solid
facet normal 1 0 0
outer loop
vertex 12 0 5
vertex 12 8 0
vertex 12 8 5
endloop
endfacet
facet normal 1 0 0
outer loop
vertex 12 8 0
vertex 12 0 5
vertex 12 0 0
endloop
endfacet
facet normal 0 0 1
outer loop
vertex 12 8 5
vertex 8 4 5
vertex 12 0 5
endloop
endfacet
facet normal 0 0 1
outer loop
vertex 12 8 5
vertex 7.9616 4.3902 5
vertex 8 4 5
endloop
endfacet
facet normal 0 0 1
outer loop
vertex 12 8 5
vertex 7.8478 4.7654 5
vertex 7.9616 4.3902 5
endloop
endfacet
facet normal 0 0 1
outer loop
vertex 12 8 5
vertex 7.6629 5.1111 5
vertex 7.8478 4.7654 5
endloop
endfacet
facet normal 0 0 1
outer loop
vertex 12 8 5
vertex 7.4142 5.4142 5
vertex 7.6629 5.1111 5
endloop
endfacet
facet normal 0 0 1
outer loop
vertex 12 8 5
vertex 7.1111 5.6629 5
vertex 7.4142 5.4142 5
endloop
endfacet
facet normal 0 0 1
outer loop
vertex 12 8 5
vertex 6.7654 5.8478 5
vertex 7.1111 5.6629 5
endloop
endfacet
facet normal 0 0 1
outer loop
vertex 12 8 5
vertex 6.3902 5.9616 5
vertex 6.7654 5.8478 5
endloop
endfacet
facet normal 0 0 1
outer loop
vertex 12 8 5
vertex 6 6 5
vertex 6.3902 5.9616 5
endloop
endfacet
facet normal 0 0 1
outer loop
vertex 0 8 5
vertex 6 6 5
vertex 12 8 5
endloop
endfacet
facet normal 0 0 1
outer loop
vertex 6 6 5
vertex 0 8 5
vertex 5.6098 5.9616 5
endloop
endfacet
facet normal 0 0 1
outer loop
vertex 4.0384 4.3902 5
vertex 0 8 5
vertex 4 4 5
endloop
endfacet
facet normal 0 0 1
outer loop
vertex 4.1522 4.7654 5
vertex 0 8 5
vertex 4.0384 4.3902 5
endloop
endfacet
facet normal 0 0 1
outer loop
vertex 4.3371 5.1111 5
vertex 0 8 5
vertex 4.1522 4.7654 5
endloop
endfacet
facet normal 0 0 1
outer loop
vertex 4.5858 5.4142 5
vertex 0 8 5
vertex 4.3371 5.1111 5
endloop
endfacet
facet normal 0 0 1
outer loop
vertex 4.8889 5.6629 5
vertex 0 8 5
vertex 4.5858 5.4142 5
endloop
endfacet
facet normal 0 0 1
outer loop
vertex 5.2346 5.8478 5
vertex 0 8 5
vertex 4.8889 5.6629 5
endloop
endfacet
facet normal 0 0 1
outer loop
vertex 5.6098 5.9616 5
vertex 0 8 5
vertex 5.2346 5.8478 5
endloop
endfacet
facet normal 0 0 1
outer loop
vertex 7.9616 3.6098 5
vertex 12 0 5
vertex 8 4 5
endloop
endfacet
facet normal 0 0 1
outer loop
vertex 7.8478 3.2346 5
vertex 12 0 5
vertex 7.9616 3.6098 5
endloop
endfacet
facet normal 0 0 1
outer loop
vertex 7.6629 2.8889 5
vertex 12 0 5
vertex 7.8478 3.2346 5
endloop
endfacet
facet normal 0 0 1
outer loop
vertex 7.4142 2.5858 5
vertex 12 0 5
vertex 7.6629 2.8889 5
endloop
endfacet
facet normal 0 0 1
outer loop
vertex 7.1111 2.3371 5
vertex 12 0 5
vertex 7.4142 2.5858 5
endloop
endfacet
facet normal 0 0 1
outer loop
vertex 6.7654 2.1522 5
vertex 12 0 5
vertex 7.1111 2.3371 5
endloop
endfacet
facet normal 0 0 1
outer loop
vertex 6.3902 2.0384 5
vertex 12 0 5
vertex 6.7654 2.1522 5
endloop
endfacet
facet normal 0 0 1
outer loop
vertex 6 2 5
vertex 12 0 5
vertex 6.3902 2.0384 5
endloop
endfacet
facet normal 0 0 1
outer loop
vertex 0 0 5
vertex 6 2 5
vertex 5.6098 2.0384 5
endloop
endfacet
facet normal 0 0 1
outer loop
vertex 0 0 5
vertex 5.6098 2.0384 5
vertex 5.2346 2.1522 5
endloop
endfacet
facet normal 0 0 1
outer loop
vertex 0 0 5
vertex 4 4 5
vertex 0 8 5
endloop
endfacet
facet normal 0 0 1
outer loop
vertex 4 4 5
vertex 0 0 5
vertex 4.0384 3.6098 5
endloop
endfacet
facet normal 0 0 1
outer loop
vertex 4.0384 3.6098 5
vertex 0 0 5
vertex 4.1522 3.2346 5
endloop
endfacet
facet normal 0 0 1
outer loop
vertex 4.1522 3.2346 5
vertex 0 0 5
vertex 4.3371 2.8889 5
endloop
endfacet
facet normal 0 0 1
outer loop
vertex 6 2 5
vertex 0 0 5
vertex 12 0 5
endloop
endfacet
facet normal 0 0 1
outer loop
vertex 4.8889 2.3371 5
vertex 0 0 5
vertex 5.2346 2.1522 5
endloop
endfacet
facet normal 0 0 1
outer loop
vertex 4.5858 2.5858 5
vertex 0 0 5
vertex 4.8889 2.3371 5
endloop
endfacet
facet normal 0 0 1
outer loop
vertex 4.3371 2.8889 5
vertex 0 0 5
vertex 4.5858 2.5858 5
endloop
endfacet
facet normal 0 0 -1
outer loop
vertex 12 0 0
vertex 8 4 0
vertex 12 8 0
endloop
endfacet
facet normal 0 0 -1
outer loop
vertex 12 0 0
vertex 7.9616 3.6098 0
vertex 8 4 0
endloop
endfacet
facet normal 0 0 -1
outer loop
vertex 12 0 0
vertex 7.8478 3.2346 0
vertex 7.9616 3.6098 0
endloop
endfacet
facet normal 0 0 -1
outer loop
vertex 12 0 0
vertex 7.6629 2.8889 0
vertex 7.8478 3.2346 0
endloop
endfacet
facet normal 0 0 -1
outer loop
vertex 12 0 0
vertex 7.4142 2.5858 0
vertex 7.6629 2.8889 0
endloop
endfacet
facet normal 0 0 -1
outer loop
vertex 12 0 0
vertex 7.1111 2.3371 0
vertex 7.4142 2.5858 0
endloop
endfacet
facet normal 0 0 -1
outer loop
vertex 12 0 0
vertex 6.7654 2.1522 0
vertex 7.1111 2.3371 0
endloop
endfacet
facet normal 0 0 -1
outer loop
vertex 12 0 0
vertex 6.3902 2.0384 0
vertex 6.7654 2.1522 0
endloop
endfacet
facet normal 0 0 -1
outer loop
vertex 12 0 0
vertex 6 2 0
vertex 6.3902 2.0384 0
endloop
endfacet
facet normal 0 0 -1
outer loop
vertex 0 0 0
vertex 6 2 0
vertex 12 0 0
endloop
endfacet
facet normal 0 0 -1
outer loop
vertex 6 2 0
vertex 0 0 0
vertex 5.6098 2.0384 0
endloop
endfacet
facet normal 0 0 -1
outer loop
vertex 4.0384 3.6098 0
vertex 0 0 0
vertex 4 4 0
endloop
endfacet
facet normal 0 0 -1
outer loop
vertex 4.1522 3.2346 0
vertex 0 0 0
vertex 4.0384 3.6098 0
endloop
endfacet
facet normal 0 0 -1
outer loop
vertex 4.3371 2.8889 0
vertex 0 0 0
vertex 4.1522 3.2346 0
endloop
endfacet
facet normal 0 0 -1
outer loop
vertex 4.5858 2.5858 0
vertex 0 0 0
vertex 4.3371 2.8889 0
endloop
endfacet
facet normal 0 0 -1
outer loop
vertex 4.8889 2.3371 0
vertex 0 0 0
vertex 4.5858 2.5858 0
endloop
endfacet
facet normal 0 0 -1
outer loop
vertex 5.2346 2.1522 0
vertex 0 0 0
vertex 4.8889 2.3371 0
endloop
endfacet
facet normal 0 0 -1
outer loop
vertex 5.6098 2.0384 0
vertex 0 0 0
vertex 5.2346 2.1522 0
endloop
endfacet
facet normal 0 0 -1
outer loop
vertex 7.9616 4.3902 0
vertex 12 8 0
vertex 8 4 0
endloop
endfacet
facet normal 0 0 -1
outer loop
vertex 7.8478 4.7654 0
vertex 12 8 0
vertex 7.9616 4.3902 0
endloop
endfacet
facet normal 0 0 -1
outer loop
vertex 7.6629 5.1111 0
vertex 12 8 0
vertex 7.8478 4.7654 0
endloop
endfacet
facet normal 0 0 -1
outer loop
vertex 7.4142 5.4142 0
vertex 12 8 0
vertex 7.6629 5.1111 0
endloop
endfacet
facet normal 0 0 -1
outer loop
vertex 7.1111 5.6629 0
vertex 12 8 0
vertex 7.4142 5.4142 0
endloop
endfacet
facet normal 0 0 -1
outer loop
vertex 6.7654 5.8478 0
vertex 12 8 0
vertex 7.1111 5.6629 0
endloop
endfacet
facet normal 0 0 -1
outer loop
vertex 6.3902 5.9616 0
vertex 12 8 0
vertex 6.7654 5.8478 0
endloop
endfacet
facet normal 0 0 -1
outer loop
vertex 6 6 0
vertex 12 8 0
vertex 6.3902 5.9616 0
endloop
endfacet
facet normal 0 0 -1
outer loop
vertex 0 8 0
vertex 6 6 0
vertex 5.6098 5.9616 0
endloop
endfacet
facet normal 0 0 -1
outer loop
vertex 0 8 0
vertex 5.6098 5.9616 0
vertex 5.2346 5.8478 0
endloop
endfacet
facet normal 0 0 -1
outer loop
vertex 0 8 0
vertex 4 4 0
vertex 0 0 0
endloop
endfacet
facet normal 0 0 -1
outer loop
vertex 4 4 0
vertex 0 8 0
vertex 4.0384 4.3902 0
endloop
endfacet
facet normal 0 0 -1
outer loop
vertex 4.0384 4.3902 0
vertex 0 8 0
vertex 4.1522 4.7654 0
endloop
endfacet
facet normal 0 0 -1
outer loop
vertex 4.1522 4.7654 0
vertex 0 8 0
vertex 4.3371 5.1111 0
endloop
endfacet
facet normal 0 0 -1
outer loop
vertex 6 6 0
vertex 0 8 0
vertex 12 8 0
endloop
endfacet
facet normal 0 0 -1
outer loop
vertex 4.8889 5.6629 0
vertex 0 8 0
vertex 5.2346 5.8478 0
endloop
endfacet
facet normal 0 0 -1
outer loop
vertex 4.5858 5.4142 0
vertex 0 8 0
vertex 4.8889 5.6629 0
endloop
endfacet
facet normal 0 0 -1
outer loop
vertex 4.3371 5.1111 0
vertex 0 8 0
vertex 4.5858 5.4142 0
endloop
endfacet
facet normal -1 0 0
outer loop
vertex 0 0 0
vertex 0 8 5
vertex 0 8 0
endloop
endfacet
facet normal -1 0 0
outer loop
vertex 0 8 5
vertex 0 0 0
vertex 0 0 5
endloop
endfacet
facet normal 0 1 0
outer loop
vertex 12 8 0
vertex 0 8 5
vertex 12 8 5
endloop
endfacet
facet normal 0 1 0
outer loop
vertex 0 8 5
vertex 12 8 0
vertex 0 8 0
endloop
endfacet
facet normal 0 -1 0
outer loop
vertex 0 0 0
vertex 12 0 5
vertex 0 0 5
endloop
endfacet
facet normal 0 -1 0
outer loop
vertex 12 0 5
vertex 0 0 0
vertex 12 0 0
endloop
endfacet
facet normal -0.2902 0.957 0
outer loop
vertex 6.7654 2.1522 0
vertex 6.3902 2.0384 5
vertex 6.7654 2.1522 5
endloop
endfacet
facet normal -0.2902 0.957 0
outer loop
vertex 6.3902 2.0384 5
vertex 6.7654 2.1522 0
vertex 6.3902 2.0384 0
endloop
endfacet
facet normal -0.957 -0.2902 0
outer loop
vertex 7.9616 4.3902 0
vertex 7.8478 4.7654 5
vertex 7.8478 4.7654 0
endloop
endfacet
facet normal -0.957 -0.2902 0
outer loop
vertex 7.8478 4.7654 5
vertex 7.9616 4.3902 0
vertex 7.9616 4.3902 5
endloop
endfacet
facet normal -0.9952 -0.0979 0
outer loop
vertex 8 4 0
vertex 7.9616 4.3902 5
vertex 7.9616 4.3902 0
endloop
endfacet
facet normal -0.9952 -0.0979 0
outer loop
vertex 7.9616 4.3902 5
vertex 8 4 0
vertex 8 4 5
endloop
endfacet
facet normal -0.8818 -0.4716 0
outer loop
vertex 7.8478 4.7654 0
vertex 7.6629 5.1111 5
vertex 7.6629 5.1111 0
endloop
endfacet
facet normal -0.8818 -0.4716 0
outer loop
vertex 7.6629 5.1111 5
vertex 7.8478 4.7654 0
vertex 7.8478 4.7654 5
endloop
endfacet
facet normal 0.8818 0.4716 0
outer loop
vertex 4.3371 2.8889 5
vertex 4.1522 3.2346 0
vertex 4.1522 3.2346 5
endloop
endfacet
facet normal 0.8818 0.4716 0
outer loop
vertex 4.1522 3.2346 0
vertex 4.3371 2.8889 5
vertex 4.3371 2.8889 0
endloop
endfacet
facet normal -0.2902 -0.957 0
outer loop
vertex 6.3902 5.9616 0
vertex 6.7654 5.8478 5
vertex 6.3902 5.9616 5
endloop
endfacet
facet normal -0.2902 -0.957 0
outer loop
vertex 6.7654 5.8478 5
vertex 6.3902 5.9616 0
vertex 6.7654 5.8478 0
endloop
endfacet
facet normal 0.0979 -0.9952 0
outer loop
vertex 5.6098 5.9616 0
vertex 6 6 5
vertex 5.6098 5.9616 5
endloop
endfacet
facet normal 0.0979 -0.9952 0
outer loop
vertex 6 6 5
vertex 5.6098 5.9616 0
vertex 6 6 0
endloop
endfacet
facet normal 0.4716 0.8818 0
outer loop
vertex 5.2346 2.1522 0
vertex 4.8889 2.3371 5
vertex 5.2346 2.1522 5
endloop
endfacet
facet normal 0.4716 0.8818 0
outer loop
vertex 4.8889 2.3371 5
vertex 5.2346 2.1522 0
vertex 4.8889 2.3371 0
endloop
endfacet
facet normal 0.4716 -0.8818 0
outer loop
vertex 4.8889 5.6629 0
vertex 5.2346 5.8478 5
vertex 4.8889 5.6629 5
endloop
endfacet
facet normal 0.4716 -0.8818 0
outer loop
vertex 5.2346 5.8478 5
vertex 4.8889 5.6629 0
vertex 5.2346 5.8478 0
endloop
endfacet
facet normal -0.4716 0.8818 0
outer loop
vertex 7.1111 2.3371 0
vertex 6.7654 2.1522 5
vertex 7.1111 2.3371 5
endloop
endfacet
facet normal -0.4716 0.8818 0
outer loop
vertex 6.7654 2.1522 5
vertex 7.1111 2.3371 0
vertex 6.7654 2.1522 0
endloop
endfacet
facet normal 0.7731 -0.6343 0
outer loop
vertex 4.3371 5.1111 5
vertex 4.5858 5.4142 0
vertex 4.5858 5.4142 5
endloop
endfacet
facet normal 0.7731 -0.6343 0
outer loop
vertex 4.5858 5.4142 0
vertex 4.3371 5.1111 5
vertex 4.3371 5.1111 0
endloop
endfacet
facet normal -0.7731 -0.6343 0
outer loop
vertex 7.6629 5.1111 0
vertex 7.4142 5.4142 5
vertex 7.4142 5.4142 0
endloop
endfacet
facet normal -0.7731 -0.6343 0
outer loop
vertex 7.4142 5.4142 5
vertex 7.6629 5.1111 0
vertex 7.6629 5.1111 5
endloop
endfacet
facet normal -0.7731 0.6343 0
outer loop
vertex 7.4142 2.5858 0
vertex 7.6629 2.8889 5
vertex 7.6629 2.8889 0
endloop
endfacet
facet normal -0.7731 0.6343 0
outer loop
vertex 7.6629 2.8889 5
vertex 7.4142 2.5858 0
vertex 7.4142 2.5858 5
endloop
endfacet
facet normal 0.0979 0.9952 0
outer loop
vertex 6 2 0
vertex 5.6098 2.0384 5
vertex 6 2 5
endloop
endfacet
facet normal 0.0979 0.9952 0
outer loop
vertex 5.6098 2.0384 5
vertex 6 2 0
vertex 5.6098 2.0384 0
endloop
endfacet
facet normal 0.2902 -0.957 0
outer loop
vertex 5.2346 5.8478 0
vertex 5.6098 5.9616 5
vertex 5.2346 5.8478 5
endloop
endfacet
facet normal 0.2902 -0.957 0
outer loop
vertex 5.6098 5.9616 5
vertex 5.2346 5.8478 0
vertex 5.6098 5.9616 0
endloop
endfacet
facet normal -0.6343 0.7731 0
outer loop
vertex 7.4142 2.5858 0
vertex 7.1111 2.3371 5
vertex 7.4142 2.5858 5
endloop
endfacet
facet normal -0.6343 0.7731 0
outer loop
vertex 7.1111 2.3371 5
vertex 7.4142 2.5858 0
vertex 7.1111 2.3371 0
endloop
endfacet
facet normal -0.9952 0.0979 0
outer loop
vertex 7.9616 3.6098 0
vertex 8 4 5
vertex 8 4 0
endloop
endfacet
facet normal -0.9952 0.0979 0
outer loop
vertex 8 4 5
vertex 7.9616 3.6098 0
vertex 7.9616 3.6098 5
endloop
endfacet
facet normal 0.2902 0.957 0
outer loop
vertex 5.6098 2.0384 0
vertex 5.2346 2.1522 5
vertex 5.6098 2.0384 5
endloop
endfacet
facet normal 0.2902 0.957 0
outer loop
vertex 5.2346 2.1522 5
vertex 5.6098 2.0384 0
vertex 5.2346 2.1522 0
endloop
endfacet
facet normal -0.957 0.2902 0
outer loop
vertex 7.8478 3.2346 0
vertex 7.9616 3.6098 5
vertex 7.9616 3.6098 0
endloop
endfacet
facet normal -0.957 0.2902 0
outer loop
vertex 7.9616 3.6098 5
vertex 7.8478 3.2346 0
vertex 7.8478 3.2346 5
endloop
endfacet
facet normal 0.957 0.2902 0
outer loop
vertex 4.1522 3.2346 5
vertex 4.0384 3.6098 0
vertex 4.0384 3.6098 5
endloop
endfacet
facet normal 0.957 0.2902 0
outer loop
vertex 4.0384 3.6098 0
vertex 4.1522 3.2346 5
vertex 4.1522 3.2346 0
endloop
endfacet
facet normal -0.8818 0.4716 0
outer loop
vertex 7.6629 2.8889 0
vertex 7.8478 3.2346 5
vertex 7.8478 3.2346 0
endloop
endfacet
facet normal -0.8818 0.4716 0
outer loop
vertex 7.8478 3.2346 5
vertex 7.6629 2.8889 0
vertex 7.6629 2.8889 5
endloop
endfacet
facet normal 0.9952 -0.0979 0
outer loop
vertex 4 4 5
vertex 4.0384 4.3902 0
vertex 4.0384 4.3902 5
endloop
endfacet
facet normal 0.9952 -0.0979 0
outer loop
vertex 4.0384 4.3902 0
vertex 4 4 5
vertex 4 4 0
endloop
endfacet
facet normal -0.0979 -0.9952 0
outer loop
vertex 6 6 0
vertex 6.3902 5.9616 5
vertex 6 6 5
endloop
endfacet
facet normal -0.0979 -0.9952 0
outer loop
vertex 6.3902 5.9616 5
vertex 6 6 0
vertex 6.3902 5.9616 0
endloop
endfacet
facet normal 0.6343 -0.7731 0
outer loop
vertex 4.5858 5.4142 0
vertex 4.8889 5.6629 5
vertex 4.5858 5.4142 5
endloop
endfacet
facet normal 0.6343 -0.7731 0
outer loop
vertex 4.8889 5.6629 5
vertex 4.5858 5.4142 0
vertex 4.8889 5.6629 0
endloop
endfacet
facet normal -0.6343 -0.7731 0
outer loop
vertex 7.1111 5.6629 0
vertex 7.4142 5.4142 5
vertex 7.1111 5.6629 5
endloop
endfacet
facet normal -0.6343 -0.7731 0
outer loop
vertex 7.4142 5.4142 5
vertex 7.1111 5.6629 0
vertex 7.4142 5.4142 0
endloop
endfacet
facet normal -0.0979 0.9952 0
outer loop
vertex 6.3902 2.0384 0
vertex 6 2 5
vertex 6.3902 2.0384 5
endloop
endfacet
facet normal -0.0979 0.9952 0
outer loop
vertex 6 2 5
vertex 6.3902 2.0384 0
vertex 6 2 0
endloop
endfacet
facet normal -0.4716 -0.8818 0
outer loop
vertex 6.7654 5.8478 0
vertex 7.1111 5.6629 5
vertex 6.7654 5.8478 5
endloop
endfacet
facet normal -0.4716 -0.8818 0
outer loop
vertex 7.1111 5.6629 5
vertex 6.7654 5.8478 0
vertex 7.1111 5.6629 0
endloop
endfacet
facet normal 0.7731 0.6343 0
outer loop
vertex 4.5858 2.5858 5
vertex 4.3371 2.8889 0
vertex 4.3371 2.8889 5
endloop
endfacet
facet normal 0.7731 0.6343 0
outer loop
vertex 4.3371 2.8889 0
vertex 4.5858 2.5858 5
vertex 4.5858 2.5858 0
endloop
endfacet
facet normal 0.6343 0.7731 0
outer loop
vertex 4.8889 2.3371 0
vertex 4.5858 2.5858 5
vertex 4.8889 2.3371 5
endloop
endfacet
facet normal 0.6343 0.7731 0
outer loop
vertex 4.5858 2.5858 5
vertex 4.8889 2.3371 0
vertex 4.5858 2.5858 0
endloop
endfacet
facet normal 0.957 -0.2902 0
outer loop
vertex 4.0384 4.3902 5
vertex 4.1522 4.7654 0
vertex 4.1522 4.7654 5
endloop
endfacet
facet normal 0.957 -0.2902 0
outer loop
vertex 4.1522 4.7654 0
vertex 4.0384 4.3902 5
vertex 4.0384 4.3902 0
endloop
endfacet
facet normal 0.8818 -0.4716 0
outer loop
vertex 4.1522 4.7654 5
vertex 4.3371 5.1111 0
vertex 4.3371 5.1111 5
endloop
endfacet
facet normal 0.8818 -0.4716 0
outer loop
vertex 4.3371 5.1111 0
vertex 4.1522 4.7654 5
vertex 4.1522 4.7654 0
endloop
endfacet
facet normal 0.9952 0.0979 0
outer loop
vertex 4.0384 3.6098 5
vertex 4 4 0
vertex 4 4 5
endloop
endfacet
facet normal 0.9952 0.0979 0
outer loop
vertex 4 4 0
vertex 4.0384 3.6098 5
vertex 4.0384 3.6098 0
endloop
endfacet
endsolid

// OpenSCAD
$fn = 32;

// ----------------------------------------------------------------------
// Micro pad: drilled pad, 5-20 mm class
// ----------------------------------------------------------------------

// --- parameters (mm) ---
pad_l = 12;               // pad length, X
pad_w = 8;                // pad width, Y
pad_t = 5;                // pad thickness, Z
hole_d = 4;               // through hole diameter

difference() {
  cube([pad_l, pad_w, pad_t]);
  translate([pad_l / 2, pad_w / 2, -1])
    cylinder(h = pad_t + 2, d = hole_d);
}
